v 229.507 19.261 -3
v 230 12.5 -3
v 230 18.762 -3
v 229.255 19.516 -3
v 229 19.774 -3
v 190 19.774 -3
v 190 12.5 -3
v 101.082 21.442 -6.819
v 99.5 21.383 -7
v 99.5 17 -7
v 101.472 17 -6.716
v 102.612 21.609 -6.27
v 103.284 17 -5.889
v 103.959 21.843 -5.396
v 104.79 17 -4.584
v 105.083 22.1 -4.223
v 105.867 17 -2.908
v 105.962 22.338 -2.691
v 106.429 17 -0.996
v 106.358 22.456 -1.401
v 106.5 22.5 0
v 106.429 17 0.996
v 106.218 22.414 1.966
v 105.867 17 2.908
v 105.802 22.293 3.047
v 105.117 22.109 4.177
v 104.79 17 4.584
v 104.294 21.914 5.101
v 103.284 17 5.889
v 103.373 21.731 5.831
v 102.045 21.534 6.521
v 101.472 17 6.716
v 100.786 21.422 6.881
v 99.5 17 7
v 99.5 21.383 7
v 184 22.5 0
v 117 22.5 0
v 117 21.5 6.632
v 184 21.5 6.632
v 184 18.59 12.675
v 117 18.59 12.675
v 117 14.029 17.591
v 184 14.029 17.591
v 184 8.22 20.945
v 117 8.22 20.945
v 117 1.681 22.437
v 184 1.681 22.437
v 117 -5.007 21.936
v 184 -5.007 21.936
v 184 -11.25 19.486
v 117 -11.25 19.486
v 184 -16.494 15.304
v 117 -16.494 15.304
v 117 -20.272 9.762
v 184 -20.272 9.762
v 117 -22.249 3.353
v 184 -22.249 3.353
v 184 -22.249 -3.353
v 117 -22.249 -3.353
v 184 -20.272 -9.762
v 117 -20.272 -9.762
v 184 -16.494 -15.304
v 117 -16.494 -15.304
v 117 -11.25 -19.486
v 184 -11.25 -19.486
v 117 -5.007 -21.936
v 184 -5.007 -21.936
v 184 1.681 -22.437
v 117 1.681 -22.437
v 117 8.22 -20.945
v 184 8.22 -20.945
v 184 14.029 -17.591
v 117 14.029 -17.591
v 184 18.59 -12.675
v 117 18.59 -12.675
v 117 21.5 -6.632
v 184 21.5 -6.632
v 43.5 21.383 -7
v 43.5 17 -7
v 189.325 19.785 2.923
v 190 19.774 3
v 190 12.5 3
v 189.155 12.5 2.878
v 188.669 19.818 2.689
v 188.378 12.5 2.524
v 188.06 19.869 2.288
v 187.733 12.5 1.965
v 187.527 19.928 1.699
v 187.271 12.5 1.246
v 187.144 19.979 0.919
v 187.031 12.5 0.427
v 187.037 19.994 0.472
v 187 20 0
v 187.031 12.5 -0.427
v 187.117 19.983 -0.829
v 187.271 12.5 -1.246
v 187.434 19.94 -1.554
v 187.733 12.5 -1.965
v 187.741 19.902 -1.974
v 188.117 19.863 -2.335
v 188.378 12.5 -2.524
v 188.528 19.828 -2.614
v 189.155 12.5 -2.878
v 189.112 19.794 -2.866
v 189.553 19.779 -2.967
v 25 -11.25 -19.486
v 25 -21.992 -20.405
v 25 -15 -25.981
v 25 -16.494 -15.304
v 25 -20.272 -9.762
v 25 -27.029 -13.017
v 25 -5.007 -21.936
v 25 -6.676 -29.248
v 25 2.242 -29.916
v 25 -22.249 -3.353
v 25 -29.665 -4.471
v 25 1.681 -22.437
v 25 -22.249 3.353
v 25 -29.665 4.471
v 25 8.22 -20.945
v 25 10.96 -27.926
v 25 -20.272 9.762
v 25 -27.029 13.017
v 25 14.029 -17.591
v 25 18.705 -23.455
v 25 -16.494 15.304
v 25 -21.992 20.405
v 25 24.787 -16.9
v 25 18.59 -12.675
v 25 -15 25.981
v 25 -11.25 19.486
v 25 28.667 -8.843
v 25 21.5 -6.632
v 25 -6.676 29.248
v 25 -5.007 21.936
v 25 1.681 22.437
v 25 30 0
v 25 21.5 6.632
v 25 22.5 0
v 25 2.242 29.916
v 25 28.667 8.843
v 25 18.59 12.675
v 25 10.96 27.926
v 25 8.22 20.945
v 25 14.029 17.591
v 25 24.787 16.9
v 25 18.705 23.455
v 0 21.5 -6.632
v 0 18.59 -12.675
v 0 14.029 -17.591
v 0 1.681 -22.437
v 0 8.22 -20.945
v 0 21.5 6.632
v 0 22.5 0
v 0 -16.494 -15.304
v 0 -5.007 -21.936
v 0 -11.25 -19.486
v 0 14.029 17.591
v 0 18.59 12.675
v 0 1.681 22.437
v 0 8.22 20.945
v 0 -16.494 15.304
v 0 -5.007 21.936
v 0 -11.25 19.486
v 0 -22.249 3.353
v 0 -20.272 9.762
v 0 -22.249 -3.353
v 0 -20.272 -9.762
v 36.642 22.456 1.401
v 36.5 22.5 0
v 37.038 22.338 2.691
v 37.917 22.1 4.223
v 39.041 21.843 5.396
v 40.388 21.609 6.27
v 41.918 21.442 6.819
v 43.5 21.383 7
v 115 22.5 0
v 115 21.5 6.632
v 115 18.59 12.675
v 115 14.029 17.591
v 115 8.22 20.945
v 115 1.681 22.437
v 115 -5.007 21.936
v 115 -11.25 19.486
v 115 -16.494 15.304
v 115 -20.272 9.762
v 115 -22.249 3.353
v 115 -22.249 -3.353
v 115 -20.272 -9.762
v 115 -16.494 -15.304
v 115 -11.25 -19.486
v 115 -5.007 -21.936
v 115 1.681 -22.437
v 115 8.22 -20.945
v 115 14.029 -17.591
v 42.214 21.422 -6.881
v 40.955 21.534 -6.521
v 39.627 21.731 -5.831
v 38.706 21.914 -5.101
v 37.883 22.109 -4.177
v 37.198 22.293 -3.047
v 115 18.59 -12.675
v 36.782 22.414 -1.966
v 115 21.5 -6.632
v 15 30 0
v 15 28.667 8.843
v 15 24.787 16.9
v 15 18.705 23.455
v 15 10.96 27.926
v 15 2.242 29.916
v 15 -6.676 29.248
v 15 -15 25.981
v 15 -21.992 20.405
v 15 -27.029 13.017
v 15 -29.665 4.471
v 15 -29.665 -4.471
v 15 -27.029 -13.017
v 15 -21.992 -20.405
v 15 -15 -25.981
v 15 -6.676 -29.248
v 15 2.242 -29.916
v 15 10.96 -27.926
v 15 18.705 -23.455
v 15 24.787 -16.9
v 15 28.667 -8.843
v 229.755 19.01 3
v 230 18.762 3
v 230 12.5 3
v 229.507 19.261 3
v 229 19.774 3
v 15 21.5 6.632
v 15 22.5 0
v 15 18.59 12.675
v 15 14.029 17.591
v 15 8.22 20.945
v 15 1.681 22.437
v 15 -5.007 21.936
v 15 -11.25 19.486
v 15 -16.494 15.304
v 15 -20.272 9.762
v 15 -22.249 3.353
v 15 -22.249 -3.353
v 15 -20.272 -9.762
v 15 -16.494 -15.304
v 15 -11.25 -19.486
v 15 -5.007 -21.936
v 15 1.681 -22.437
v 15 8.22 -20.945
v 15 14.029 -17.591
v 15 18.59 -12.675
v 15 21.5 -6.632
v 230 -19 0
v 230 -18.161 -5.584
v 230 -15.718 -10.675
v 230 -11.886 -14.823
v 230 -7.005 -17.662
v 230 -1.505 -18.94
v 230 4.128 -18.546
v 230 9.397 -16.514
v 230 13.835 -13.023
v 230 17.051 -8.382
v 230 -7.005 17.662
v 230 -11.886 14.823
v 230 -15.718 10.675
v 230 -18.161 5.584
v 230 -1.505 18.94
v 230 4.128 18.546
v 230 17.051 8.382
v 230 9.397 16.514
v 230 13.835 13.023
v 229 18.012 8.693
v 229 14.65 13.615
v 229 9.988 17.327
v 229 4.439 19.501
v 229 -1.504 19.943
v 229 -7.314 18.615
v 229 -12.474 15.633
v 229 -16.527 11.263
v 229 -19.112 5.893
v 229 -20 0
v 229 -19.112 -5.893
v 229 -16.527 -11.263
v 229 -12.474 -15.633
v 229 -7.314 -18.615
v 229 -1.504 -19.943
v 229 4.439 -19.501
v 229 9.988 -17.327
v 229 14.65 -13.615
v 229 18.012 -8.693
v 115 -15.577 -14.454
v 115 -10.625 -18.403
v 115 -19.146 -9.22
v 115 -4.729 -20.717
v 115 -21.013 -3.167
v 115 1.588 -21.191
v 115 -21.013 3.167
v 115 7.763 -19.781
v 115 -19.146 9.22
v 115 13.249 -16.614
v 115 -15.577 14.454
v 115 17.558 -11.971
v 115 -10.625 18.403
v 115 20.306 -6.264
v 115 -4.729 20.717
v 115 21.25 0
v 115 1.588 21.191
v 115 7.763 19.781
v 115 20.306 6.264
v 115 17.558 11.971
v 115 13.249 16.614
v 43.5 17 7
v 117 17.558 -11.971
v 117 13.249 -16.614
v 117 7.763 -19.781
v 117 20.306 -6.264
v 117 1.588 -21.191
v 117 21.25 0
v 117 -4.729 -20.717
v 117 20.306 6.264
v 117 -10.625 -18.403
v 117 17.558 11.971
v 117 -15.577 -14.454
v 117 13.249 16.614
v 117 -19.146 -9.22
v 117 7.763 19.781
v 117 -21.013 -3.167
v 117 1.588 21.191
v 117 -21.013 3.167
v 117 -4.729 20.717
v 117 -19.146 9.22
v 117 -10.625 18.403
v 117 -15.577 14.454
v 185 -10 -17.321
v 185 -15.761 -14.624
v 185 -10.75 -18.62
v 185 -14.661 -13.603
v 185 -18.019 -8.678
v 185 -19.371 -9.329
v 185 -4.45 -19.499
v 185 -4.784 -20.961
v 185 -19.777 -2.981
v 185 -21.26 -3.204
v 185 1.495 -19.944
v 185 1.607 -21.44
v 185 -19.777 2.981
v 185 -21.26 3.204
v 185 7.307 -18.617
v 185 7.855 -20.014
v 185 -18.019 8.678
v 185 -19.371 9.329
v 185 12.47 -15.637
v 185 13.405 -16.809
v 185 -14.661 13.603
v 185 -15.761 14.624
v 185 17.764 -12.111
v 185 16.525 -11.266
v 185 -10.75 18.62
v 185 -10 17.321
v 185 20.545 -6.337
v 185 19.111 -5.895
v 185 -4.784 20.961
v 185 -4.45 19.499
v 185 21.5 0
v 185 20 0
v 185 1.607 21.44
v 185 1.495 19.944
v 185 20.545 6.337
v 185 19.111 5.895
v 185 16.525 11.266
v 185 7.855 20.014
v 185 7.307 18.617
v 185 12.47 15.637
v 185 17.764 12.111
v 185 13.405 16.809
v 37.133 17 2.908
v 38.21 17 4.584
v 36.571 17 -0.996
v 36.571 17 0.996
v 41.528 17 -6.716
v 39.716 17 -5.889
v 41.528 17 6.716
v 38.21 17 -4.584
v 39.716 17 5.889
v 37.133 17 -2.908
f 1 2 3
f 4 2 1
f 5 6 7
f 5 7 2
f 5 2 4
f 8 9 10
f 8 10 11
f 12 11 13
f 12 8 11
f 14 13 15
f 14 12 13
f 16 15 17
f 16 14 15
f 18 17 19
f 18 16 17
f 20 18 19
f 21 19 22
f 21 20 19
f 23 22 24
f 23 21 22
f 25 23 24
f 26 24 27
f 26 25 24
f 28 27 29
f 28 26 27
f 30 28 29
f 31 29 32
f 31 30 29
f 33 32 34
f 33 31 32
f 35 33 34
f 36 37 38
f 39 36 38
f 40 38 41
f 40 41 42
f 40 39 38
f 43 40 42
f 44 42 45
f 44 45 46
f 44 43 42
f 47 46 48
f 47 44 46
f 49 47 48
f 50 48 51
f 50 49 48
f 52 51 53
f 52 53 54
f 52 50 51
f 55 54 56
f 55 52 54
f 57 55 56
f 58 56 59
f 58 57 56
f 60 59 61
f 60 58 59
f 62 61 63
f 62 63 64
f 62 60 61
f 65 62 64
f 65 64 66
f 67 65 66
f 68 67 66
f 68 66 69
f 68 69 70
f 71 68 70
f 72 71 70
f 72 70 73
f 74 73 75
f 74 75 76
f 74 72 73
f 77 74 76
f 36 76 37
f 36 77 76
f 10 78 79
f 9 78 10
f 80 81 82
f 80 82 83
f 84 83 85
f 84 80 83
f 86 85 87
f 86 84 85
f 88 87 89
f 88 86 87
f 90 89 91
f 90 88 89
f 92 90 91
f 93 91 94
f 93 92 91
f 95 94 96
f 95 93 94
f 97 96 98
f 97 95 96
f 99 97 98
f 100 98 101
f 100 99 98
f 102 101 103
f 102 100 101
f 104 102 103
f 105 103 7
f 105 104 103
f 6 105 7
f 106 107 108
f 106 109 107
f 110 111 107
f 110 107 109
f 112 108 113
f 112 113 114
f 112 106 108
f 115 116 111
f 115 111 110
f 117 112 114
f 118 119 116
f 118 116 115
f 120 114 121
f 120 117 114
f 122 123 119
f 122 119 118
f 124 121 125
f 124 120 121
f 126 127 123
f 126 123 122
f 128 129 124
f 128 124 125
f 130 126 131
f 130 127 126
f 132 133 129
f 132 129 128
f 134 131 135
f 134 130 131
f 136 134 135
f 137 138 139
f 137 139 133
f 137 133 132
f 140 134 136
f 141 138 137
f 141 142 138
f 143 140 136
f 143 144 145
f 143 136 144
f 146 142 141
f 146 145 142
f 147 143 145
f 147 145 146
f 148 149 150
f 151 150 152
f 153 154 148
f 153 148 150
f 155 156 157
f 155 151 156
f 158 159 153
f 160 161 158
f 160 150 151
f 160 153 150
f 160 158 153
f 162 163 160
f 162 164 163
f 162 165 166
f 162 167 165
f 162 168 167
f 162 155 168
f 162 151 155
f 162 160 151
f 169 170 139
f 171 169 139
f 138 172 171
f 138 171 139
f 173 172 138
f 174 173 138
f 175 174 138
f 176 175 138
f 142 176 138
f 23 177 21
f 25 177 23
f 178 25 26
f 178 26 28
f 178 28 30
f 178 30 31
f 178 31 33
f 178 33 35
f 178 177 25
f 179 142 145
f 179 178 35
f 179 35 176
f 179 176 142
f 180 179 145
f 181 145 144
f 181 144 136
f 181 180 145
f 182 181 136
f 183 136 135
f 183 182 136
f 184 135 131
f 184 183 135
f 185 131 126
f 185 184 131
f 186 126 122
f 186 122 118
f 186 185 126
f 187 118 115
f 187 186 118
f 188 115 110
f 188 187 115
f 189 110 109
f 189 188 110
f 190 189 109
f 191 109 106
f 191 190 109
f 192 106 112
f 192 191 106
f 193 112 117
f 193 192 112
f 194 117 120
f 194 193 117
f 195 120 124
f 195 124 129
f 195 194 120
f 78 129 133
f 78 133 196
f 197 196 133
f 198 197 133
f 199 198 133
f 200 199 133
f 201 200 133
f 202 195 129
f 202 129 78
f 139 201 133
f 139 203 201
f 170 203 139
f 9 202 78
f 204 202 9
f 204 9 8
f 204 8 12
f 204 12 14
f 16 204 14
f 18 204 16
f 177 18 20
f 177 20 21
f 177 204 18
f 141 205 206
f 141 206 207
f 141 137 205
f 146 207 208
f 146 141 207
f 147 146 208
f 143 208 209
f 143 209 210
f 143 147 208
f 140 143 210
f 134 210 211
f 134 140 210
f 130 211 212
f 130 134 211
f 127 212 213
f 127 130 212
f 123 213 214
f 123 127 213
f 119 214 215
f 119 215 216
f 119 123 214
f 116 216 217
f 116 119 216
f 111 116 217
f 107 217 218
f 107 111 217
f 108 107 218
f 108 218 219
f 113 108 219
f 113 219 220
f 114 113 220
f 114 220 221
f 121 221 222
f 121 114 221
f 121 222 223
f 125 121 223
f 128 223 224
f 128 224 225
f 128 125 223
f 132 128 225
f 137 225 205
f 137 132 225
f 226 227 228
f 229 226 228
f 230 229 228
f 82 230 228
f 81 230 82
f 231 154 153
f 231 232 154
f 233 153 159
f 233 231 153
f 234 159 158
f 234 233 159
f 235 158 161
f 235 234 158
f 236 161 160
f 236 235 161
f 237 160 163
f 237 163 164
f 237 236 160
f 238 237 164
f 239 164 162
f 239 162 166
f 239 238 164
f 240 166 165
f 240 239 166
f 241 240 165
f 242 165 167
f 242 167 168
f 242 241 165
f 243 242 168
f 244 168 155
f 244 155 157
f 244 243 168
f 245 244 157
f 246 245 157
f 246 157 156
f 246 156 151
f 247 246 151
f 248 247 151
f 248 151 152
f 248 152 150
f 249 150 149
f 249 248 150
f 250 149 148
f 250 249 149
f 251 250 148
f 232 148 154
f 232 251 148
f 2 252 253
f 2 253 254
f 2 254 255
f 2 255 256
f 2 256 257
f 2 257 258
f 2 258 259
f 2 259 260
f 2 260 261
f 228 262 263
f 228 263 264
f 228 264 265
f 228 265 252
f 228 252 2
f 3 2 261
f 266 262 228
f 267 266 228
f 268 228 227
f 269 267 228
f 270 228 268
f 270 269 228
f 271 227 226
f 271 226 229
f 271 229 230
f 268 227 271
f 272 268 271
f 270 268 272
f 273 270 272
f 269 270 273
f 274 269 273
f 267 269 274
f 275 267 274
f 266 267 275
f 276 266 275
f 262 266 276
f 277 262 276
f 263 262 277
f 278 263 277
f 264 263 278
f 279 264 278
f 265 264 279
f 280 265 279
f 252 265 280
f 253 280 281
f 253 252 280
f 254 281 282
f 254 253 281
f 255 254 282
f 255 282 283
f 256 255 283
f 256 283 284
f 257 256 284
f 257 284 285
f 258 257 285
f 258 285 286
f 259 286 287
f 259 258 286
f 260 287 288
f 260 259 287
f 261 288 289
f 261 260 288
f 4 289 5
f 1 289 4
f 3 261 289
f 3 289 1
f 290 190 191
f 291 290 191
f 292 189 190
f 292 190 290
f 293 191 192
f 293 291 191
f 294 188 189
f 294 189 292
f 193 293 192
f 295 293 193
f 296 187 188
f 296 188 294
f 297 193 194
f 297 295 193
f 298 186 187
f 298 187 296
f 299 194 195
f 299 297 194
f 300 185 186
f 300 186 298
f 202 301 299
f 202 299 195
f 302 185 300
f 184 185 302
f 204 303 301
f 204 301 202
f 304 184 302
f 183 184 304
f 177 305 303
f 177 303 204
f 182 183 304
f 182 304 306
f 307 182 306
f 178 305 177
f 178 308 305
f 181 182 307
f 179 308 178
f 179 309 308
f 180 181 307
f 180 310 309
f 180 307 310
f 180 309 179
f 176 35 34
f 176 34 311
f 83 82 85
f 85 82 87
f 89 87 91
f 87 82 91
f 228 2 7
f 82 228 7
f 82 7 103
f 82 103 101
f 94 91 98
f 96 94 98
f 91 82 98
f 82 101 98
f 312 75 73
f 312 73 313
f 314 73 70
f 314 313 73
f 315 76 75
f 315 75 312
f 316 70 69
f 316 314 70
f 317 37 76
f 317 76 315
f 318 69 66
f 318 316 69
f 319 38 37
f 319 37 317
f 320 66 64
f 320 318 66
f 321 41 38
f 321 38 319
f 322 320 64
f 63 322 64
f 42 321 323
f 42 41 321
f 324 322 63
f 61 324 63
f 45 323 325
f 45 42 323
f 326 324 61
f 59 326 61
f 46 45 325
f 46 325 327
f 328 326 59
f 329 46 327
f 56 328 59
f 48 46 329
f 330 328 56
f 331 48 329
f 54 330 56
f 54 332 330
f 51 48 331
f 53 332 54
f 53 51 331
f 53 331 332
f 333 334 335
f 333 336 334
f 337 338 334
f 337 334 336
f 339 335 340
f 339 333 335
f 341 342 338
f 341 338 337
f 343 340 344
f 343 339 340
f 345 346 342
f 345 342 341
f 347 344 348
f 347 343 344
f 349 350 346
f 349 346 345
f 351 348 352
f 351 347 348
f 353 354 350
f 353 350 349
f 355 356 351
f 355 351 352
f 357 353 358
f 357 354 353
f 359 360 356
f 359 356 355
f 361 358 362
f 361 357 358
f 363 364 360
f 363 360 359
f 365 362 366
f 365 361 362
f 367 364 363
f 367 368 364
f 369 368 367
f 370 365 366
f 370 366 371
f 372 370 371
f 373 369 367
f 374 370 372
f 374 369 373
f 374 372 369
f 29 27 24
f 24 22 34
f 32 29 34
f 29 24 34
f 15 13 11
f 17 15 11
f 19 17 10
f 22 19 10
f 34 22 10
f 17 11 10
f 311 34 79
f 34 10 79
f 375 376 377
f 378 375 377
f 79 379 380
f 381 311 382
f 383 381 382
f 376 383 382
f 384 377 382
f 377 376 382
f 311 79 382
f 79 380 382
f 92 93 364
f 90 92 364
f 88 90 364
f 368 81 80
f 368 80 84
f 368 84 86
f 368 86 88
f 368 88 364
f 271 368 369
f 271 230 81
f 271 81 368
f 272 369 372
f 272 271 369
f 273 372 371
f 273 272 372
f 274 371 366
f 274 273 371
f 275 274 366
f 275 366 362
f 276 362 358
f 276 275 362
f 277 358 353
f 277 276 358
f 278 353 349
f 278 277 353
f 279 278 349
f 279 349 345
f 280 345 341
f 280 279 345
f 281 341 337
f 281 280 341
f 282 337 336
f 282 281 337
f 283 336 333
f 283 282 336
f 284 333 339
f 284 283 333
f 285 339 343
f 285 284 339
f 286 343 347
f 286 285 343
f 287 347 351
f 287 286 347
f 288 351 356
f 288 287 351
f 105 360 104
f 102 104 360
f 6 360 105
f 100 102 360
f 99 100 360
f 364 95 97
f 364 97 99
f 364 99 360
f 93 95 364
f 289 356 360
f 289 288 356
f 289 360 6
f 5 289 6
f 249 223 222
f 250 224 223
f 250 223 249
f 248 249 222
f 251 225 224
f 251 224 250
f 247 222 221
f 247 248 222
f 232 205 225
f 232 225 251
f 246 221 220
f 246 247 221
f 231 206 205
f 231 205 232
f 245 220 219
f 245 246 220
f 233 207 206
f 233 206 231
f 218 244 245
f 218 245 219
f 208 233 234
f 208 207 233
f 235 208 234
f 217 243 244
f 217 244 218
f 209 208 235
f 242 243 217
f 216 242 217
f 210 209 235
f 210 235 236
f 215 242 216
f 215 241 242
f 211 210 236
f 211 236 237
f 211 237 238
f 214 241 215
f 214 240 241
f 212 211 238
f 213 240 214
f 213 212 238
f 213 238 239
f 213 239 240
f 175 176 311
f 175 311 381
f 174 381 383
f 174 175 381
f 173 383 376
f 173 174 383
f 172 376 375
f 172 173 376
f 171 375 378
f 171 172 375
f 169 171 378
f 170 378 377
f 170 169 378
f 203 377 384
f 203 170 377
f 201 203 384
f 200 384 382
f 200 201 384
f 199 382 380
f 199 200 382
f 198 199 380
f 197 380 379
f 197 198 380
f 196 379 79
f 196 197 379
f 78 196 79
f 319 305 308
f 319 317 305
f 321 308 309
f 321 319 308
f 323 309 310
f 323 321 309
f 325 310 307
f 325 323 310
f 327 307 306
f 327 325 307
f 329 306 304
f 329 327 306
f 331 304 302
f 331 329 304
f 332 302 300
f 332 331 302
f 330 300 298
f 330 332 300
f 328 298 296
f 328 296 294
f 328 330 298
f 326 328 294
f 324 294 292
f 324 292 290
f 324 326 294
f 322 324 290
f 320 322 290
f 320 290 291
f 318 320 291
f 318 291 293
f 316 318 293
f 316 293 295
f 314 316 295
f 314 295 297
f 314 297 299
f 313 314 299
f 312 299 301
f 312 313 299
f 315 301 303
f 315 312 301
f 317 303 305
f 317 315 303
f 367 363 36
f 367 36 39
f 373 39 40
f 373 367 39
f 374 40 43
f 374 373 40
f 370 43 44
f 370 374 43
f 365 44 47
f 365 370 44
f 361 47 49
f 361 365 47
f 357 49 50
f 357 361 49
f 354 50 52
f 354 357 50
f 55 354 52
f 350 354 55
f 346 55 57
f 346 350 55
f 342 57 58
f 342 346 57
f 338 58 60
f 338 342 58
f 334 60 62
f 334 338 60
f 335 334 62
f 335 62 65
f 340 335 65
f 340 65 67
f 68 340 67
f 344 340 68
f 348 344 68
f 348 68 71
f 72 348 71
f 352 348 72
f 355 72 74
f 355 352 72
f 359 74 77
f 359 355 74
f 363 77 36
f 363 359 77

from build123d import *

# Parameters (mm, degrees)
ZKOSEN_1_SIZE            = 1
ODEBRAT_VYSUNUT_M1_DEPTH = 7.5
ODEBRAT_VYSUNUT_M2_DEPTH = 5.5


with BuildPart() as part:
    # Skica1 → Rotovat1 (revolve)
    with BuildSketch(Plane.XY):
        Polygon((0, 0), (0, 22.5), (15, 22.5), (15, 30), (25, 30), (25, 22.5), (115, 22.5), (115, 21.25), (117, 21.25), (117, 22.5), (185, 22.5), (185, 20), (230, 20), (230, 0), align=None)
    revolve(axis=Axis((-258.80539499, 0, 0), (1, 0, 0)))

    # Zkosení1
    zkosen_1_edges = [part.edges().sort_by_distance(p)[0] for p in [
        (185, -22.5, 0),
        (230, -20, 0),
    ]]
    chamfer(zkosen_1_edges, length=ZKOSEN_1_SIZE)

    # Skica6 → Odebrat vysunutím1 (cut)
    with BuildSketch(Plane(origin=(0, 20, 0), x_dir=(1, 0, 0), z_dir=(0, 1, 0))):
        with BuildLine():
            Line((230, -3), (190, -3))
            ThreePointArc((190, -3), (187, 0), (190, 3))
            Line((190, 3), (230, 3))
            ThreePointArc((230, 3), (233, 0), (230, -3))
        make_face()
    extrude(amount=-ODEBRAT_VYSUNUT_M1_DEPTH, mode=Mode.SUBTRACT)

    # Skica7 → Odebrat vysunutím2 (cut)
    with BuildSketch(Plane(origin=(0, 22.5, 0), x_dir=(1, 0, 0), z_dir=(0, 1, 0))):
        with BuildLine():
            Line((43.5, 7), (99.5, 7))
            ThreePointArc((99.5, 7), (106.5, 0), (99.5, -7))
            Line((99.5, -7), (43.5, -7))
            ThreePointArc((43.5, -7), (36.5, 0), (43.5, 7))
        make_face()
    extrude(amount=-ODEBRAT_VYSUNUT_M2_DEPTH, mode=Mode.SUBTRACT)


solid = part.part
